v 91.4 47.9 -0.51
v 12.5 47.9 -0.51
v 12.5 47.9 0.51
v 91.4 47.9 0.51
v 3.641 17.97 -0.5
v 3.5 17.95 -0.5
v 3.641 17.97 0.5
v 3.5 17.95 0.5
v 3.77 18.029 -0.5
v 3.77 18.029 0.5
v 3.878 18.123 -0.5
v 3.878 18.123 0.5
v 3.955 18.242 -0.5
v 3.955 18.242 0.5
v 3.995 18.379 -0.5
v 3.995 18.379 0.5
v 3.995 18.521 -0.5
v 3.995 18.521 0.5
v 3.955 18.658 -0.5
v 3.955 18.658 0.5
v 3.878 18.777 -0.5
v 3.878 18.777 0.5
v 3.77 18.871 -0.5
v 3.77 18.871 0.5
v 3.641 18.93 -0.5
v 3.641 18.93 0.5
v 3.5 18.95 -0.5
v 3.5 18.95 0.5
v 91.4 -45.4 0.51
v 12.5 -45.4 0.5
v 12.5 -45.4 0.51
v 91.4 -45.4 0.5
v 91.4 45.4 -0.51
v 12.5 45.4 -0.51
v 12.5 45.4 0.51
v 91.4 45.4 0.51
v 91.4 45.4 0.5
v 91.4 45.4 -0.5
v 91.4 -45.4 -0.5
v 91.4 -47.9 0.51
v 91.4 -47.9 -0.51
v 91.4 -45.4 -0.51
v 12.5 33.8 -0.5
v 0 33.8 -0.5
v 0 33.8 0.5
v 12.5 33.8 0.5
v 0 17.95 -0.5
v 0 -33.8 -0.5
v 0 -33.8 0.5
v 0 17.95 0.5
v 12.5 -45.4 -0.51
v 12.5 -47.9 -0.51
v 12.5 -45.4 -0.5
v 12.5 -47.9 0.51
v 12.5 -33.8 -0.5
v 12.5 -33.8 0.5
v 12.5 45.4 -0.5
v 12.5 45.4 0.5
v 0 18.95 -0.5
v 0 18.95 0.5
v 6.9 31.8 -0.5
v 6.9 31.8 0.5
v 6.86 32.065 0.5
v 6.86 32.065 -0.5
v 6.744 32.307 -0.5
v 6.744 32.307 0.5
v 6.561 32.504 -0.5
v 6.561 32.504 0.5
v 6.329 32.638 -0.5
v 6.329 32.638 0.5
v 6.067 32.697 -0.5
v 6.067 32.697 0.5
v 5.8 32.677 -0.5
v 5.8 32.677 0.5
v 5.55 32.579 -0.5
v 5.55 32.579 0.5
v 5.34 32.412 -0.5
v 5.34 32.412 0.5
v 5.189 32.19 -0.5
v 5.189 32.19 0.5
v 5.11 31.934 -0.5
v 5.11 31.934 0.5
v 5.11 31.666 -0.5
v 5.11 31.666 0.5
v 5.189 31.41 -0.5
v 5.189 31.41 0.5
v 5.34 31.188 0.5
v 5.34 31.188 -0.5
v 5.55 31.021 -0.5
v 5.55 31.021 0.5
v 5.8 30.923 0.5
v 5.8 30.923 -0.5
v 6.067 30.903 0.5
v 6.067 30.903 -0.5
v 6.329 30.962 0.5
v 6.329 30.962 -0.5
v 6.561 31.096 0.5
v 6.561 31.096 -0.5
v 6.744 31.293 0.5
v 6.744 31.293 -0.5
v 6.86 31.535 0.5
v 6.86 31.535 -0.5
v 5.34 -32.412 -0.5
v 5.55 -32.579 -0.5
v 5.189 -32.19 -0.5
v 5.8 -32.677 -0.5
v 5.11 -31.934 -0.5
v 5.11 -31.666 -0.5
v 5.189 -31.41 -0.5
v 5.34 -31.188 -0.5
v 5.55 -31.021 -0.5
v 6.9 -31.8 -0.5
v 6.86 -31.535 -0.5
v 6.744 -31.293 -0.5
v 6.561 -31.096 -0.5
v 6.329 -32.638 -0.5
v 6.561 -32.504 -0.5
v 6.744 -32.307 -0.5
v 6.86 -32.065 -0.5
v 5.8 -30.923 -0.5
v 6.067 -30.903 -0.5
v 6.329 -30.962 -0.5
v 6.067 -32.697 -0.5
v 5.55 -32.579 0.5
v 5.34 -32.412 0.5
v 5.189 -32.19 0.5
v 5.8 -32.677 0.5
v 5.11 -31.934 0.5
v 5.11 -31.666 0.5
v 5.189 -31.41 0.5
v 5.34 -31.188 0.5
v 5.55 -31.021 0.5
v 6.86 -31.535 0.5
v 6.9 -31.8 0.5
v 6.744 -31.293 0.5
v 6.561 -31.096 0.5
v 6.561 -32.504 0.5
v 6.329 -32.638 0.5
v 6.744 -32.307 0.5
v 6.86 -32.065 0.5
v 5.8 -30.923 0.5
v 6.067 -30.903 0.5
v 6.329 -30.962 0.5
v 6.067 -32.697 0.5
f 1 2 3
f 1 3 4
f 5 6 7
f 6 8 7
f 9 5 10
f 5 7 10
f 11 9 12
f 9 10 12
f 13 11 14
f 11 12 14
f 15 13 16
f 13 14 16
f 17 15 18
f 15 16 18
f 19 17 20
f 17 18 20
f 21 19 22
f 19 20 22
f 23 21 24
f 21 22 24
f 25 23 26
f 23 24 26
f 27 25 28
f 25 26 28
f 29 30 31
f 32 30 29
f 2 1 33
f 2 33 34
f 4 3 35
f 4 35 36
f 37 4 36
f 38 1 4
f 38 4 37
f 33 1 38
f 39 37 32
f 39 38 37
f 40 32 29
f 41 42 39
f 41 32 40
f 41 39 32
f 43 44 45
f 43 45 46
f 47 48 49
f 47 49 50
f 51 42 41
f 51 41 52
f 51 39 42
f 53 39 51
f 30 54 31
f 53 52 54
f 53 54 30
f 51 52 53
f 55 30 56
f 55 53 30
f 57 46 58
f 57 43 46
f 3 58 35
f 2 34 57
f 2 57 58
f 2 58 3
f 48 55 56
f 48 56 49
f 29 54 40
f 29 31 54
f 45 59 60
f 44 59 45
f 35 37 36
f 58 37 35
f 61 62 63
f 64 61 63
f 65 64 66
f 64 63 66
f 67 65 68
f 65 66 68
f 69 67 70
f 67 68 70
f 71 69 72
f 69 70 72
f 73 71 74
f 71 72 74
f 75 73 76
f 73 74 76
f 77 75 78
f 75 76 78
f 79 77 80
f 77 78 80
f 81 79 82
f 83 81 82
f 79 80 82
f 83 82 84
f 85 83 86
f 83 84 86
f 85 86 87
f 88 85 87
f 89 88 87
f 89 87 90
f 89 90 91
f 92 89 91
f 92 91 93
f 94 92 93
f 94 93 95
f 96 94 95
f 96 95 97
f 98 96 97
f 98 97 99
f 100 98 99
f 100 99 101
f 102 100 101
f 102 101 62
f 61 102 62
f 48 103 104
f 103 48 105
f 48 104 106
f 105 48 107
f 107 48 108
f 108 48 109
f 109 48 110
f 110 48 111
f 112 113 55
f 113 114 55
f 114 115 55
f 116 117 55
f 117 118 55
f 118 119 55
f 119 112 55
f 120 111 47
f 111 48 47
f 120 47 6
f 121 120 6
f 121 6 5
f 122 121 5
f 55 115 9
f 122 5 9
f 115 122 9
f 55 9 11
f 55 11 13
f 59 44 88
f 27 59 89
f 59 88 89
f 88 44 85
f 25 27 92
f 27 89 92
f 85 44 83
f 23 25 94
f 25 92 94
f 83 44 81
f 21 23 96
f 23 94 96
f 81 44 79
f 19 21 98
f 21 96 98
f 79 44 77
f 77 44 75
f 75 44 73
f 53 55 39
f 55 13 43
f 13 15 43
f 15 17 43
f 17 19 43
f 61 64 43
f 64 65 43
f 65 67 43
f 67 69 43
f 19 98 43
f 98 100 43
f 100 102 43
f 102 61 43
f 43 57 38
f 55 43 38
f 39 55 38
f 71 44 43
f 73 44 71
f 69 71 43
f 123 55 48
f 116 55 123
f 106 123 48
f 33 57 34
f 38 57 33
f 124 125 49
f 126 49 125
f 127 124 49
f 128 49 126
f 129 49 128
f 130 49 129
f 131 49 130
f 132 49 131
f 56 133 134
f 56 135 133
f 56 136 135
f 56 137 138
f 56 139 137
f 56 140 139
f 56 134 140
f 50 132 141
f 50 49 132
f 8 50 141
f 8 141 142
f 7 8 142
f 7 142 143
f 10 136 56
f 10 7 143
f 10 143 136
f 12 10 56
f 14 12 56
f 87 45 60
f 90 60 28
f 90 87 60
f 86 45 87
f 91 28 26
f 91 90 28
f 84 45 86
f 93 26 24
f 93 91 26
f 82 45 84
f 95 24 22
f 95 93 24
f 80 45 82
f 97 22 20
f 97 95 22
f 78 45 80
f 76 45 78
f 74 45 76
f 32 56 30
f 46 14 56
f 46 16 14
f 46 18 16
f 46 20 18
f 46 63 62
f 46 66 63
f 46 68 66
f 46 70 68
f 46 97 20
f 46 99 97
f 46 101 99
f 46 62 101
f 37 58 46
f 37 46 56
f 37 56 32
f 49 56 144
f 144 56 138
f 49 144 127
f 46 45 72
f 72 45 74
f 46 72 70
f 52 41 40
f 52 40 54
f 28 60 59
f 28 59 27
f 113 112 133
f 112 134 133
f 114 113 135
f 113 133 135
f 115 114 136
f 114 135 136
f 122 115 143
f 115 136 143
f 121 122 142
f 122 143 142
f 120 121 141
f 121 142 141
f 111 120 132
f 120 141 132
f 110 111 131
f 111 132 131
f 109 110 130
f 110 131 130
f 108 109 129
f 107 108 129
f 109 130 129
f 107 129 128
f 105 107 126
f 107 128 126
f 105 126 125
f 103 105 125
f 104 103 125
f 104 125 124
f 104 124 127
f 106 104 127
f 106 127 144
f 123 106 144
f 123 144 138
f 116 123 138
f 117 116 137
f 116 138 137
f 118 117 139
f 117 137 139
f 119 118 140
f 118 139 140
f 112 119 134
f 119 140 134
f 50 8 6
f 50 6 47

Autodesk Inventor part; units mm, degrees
ref_plane "YZ Plane" through (0, 0, 0) normal (1, 0, 0) x (0, 1, 0)
ref_plane "XZ Plane" through (0, 0, 0) normal (0, 1, 0) x (-1, 0, 0)
ref_plane "XY Plane" through (0, 0, 0) normal (0, 0, 1) x (1, 0, 0)
sketch "Sketch1" plane through (0, 0, 0) normal (0, 0, 1) x (1, 0, 0)
  line L0 (0, 33.8) -> (12.5, 33.8)
  line L1 (12.5, 33.8) -> (12.5, 47.9)
  line L2 (12.5, 47.9) -> (91.4, 47.9)
  line L3 (91.4, 47.9) -> (91.4, -47.9)
  line L4 (91.4, -47.9) -> (12.5, -47.9)
  line L5 (12.5, -47.9) -> (12.5, -33.8)
  line L6 (12.5, -33.8) -> (0, -33.8)
  line L7 (0, -33.8) -> (0, 33.8)
  line L8 (-4.5, 48) -> (91.5, 48) construction
  line L9 (91.5, 48) -> (91.5, -48) construction
  line L10 (91.5, -48) -> (-4.5, -48) construction
  line L11 (-4.5, -48) -> (-4.5, 48) construction
  line L12 (-4.4, 47.9) -> (-3.4, 47.9) construction
  line L13 (-3.4, 47.9) -> (-3.4, -47.9) construction
  line L14 (-3.4, -47.9) -> (-4.4, -47.9) construction
  line L15 (-4.4, -47.9) -> (-4.4, 47.9) construction
  point P0 (0, 0)
  point P1 (0, 0)
  point P2 (-4.5, 0)
  dimension "d0" = 67.6
  dimension "d1" = 95.8
  dimension "d2" = 91.4
  dimension "d3" = 12.5
  dimension "d20" = 96
  dimension "d21" = 96
  dimension "d22" = 0.1
  dimension "d23" = 0.1
  dimension "d24" = 1
  dimension "d25" = 0.1
  dimension "d26" = 3.4
extrude "Extrusion1" add sketch "Sketch1" along normal mid plane 1
sketch "Sketch2" plane through (0, 0, 0.5) normal (0, 0, 1) x (1, 0, 0)
  line L0 (12.5, 33.8) -> (0, 33.8) projected
  line L1 (0, 33.8) -> (0, -33.8) projected
  line L2 (0, -33.8) -> (12.5, -33.8) projected
  line L3 (12.5, -33.8) -> (12.5, -47.9) projected
  line L4 (12.5, -47.9) -> (91.4, -47.9) projected
  line L5 (91.4, -47.9) -> (91.4, 47.9) projected
  line L6 (91.4, 47.9) -> (12.5, 47.9) projected
  line L7 (12.5, 47.9) -> (12.5, 33.8) projected
  line L8 (91.4, -47.9) -> (91.4, 47.9) projected
  line L9 (12.5, 47.9) -> (91.4, 47.9)
  line L10 (91.4, 47.9) -> (91.4, 45.4)
  line L11 (91.4, 45.4) -> (12.5, 45.4)
  line L12 (12.5, 45.4) -> (12.5, 47.9)
  line L13 (91.4, -47.9) -> (12.5, -47.9)
  line L14 (12.5, -47.9) -> (12.5, -45.4)
  line L15 (12.5, -45.4) -> (91.4, -45.4)
  line L16 (91.4, -45.4) -> (91.4, -47.9)
  point P0 (0, 0)
  dimension "d6" = 2.5
  dimension "d27" = 90.8
extrude "Extrusion2" add sketch "Sketch2" along normal blind 0.01 contours L7 L6 L5 L11 | L5 L4 L3 L15
mirror "Mirror1" about plane through (0, 0, 0) normal (0, 0, 1) of "Extrusion2"
sketch "Sketch3" plane through (0, 0, 0.5) normal (0, 0, 1) x (1, 0, 0)
  circle A0 centre (6, 31.8) radius 0.9
  circle A1 centre (6, -31.8) radius 0.9
  point P0 (0, 0)
  dimension "d9" = 1.8
  dimension "d10" = 6
  dimension "d11" = 31.8
  dimension "d12" = 31.8
extrude "Extrusion3" cut sketch "Sketch3" against normal through all
sketch "Sketch4" plane through (0, 0, 0.5) normal (0, 0, 1) x (1, 0, 0)
  circle A0 centre (6, 31.8) radius 0.9 projected
  circle A1 centre (6, -31.8) radius 0.9 projected
  line L0 (12.5, -45.4) -> (91.4, -45.4) projected
  line L1 (91.4, -45.4) -> (91.4, 45.4) projected
  line L2 (91.4, 45.4) -> (12.5, 45.4) projected
  line L3 (12.5, 45.4) -> (12.5, 33.8) projected
  line L4 (12.5, 33.8) -> (0, 33.8) projected
  line L5 (0, 33.8) -> (0, -33.8) projected
  line L6 (0, -33.8) -> (12.5, -33.8) projected
  line L7 (12.5, -33.8) -> (12.5, -45.4) projected
  line L8 (0, 18.95) -> (3.5, 18.95)
  arc A2 (3.5, 17.95) -> (3.5, 18.95) centre (3.5, 18.45) ccw
  line L9 (3.5, 17.95) -> (0, 17.95)
  point P0 (0, 0)
  dimension "d15" = 17.95
  dimension "d16" = 3.5
  dimension "d17" = 1
extrude "Extrusion4" cut sketch "Sketch4" against normal through all contours L5 L8 A2 L9
equation "\"d23\" = d22"
equation "\"d25\" = d22"
equation "\"d12\" = d11"
properties part number "RCS_PCB" material "Epoxy Resin"
